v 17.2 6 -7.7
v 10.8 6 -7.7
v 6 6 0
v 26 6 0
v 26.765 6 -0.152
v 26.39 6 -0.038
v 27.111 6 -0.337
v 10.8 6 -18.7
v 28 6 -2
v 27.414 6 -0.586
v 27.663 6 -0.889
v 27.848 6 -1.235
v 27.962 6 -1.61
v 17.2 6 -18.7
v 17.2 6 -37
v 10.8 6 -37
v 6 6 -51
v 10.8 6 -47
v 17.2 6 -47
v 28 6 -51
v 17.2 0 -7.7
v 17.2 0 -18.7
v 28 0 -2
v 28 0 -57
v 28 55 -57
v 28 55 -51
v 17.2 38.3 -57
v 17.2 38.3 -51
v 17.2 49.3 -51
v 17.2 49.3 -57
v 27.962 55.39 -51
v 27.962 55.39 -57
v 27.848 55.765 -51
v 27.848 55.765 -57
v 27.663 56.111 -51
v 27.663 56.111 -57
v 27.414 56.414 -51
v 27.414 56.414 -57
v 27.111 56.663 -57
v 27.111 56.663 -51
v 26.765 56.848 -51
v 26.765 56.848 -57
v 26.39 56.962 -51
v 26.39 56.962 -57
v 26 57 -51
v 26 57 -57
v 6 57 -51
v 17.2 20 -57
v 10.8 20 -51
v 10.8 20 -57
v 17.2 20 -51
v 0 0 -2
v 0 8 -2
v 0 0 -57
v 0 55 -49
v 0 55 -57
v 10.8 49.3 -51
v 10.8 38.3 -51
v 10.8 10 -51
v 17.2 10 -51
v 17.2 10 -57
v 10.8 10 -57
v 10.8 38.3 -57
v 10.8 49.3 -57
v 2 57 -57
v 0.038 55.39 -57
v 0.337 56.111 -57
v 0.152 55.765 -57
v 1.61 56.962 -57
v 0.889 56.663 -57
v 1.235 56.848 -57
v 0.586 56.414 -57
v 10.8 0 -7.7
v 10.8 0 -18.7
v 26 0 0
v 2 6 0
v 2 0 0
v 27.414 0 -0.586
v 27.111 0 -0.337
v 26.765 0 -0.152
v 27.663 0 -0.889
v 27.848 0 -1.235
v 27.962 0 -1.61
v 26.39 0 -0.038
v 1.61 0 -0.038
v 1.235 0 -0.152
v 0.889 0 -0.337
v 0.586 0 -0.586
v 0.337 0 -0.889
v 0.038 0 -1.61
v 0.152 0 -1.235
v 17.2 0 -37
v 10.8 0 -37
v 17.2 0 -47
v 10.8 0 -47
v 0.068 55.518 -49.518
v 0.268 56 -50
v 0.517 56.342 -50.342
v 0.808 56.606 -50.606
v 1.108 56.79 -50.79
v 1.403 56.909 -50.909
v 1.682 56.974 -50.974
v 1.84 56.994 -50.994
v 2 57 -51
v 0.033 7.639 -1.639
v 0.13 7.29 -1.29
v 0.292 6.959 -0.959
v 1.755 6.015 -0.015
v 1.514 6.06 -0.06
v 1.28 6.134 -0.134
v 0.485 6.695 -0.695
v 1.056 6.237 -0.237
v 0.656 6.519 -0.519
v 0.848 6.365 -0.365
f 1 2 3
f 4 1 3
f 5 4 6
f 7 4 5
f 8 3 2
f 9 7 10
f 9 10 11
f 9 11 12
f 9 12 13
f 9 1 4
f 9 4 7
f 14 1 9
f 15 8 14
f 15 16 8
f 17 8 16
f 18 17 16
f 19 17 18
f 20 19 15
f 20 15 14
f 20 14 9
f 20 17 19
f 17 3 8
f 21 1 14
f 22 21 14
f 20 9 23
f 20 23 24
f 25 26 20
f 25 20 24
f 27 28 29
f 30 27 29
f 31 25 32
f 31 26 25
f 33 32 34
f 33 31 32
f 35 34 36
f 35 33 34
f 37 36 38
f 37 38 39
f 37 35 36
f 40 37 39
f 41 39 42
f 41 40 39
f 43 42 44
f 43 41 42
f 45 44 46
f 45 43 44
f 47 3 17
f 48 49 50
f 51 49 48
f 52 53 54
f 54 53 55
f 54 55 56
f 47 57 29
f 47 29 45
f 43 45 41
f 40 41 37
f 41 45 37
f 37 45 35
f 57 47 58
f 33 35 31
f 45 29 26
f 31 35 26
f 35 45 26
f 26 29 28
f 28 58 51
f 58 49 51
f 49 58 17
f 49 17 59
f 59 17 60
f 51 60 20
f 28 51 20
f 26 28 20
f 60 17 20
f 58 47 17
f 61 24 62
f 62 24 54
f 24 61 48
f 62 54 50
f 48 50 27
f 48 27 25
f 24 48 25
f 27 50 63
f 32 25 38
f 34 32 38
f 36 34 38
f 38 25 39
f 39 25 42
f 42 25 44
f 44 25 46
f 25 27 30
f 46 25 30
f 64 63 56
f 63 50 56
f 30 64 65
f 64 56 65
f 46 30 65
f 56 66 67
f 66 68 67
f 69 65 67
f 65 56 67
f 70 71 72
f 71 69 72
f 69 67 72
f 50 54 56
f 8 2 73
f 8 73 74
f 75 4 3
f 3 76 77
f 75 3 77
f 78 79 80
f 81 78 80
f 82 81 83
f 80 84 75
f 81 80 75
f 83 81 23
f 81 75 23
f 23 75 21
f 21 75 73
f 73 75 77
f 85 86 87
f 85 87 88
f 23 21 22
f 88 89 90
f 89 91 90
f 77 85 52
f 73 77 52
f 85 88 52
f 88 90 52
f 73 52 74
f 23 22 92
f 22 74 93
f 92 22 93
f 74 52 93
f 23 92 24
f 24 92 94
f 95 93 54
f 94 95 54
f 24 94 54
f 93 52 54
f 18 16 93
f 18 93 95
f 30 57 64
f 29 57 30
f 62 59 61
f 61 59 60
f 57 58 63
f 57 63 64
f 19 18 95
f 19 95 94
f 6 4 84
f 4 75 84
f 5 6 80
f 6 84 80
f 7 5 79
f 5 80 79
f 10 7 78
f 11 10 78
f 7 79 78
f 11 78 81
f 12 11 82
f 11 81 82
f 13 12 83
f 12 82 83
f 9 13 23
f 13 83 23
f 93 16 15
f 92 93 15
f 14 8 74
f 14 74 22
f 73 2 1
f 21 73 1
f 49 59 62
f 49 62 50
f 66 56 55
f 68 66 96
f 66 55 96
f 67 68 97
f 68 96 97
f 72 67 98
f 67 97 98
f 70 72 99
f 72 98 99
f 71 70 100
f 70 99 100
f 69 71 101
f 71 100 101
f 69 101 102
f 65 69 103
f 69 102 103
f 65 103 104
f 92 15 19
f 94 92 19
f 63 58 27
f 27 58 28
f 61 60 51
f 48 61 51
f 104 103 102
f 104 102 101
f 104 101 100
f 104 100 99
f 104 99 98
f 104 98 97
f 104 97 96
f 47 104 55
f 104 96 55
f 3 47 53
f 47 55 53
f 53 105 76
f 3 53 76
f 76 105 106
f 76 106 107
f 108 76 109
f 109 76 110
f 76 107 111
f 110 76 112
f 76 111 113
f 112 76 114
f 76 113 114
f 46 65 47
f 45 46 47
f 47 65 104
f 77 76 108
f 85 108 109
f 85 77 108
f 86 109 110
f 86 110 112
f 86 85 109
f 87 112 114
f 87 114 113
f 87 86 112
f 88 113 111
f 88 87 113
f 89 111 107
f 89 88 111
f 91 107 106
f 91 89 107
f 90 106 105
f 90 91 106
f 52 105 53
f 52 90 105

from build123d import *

# Parameters (mm, degrees)
SALIENTE_EXTRUIR1_DEPTH = 28
VACIADO2_START          = 6
VACIADO2_OUTLINE_W      = 22
VACIADO2_OUTLINE_H      = 53
VACIADO2_DEPTH          = 51
CORTAR_EXTRUIR1_REACH   = 83.449
CROQUIS2_W              = 6.4
CROQUIS2_H              = 11
CROQUIS2_H_2            = 10
CORTAR_EXTRUIR2_REACH   = 83.449
CROQUIS5_W              = 6.4
CROQUIS5_H              = 10
CROQUIS5_H_2            = 11
REDONDEO2_R             = 2


# Read off the part's stored shape, not the designer's step: Vaciado2
with BuildPart() as part:
    # Croquis1 → Saliente-Extruir1 (new body)
    with BuildSketch(Plane(origin=(0, 0, 0), x_dir=(0, 0, -1), z_dir=(1, 0, 0))):
        Polygon((0, 0), (57, 0), (57, 57), (51, 57), (0, 6), align=None)
    extrude(amount=SALIENTE_EXTRUIR1_DEPTH)

    # Vaciado2 outline → Vaciado2 (cut)
    with BuildSketch(Plane(origin=(0, 0, 0), x_dir=(1, 0, 0), z_dir=(0, 1, 0)).offset(VACIADO2_START)):
        with Locations((17, 24.5)):
            Rectangle(VACIADO2_OUTLINE_W, VACIADO2_OUTLINE_H)
    extrude(amount=VACIADO2_DEPTH, mode=Mode.SUBTRACT)

    # Croquis2 → Cortar-Extruir1 (cut, up to next)
    with BuildSketch(Plane.XY.offset(-51), mode=Mode.PRIVATE) as cortar_extruir1_sk1:
        with Locations((14, 43.8)):
            Rectangle(CROQUIS2_W, CROQUIS2_H)
    cortar_extruir1_tool1 = extrude(cortar_extruir1_sk1.sketch, amount=-CORTAR_EXTRUIR1_REACH, mode=Mode.PRIVATE) & part.part
    # Croquis2 → Cortar-Extruir1 (cut, up to next)
    with BuildSketch(Plane.XY.offset(-51), mode=Mode.PRIVATE) as cortar_extruir1_sk2:
        with Locations((14, 15)):
            Rectangle(CROQUIS2_W, CROQUIS2_H_2)
    cortar_extruir1_tool2 = extrude(cortar_extruir1_sk2.sketch, amount=-CORTAR_EXTRUIR1_REACH, mode=Mode.PRIVATE) & part.part
    add(cortar_extruir1_tool1.solids().sort_by_distance((14, 43.8, -51))[0], mode=Mode.SUBTRACT)
    add(cortar_extruir1_tool2.solids().sort_by_distance((14, 15, -51))[0], mode=Mode.SUBTRACT)

    # Croquis5 → Cortar-Extruir2 (cut, up to next)
    with BuildSketch(Plane(origin=(0, 6, 0), x_dir=(1, 0, 0), z_dir=(0, 1, 0)), mode=Mode.PRIVATE) as cortar_extruir2_sk1:
        with Locations((14, 42)):
            Rectangle(CROQUIS5_W, CROQUIS5_H)
    cortar_extruir2_tool1 = extrude(cortar_extruir2_sk1.sketch, amount=-CORTAR_EXTRUIR2_REACH, mode=Mode.PRIVATE) & part.part
    # Croquis5 → Cortar-Extruir2 (cut, up to next)
    with BuildSketch(Plane(origin=(0, 6, 0), x_dir=(1, 0, 0), z_dir=(0, 1, 0)), mode=Mode.PRIVATE) as cortar_extruir2_sk2:
        with Locations((14, 13.2)):
            Rectangle(CROQUIS5_W, CROQUIS5_H_2)
    cortar_extruir2_tool2 = extrude(cortar_extruir2_sk2.sketch, amount=-CORTAR_EXTRUIR2_REACH, mode=Mode.PRIVATE) & part.part
    add(cortar_extruir2_tool1.solids().sort_by_distance((14, 6, -42))[0], mode=Mode.SUBTRACT)
    add(cortar_extruir2_tool2.solids().sort_by_distance((14, 6, -13.2))[0], mode=Mode.SUBTRACT)

    # Redondeo2
    redondeo2_edges = [part.edges().sort_by_distance(p)[0] for p in [
        (28, 3, 0),
        (28, 57, -54),
        (0, 3, 0),
        (0, 57, -54),
    ]]
    fillet(redondeo2_edges, radius=REDONDEO2_R)


solid = part.part
